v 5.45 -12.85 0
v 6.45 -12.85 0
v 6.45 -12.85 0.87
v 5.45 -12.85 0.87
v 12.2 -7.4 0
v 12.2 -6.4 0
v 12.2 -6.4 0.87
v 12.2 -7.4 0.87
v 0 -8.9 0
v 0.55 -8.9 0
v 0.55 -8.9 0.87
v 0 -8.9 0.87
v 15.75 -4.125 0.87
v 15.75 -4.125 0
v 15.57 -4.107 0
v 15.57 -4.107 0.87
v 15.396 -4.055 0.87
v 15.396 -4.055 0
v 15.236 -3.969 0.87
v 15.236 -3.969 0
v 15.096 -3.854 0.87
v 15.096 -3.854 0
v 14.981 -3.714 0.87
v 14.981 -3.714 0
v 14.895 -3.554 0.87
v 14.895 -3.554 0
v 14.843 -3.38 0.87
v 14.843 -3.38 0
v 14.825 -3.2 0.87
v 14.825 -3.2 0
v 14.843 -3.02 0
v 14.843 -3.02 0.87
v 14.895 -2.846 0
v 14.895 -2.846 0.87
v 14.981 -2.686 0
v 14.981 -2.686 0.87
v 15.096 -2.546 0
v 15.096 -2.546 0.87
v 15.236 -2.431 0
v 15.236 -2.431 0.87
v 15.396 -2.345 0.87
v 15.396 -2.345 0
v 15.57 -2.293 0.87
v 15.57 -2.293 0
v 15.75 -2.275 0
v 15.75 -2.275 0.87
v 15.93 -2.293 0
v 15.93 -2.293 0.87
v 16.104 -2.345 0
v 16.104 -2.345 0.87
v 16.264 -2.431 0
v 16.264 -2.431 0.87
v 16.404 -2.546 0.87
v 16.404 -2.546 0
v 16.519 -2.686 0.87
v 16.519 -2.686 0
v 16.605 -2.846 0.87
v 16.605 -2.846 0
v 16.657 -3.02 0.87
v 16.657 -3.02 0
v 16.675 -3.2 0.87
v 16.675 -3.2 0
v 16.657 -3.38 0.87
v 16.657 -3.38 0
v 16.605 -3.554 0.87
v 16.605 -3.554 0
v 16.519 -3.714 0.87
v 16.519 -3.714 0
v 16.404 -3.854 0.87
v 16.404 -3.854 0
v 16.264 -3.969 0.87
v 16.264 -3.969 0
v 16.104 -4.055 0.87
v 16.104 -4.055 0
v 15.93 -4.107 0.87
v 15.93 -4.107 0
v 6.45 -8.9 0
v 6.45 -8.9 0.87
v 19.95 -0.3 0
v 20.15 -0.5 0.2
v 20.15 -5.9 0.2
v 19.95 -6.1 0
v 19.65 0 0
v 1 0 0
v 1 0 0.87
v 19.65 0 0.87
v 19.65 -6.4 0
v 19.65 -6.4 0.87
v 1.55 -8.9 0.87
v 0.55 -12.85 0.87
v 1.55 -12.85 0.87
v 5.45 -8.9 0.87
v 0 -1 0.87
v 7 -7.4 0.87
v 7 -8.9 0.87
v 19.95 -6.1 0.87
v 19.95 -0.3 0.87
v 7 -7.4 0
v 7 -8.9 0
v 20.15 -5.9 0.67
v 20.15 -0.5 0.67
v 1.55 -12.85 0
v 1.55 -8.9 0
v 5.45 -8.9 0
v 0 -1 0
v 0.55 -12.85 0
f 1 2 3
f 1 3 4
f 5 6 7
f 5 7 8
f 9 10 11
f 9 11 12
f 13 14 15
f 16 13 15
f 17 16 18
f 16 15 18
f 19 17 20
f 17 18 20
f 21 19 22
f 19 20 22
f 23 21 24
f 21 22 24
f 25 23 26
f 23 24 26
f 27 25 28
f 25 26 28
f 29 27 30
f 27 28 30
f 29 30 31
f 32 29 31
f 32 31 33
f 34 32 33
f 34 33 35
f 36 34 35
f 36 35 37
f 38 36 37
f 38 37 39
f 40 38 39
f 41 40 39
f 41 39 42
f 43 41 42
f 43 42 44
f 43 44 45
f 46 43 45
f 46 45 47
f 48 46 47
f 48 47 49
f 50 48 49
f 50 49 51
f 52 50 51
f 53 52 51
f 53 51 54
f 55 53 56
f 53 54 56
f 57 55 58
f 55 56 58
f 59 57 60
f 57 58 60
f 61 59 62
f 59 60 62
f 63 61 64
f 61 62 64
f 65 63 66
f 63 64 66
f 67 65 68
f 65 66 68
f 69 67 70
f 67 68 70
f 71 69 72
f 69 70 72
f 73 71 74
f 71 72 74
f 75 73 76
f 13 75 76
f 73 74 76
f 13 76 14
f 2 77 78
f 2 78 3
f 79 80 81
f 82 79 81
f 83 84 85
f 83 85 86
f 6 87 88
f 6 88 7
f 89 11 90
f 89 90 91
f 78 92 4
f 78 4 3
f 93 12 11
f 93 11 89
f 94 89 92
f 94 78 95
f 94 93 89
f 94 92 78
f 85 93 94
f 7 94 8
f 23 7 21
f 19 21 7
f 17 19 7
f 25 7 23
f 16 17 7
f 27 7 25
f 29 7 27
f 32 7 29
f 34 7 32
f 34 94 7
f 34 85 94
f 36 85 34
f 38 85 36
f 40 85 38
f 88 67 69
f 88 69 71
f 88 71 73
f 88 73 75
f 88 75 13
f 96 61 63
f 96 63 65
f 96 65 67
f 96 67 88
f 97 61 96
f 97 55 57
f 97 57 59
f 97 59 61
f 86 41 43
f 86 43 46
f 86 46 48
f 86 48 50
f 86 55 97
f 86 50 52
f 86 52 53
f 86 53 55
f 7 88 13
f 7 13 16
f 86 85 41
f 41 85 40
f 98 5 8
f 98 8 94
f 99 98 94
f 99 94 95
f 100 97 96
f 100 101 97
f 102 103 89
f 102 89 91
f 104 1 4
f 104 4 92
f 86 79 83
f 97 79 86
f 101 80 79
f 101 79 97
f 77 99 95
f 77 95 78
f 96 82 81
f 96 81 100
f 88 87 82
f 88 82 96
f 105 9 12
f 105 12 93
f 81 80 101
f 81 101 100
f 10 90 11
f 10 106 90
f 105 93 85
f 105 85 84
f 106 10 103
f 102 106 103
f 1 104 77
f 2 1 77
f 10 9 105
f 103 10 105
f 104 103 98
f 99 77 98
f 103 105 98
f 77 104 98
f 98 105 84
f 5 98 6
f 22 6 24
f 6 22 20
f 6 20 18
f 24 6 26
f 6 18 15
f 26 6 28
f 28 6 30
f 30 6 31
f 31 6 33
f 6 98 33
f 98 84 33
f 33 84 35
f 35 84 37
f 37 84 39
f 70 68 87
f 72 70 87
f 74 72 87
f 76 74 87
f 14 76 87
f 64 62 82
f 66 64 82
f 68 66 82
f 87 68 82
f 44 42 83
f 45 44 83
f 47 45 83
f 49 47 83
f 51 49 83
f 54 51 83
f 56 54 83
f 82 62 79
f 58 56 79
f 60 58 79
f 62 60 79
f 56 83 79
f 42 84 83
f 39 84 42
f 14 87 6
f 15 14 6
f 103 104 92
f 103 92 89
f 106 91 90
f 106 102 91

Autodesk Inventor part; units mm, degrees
ref_plane "YZ Plane" through (0, 0, 0) normal (1, 0, 0) x (0, 1, 0)
ref_plane "XZ Plane" through (0, 0, 0) normal (0, 1, 0) x (-1, 0, 0)
ref_plane "XY Plane" through (0, 0, 0) normal (0, 0, 1) x (1, 0, 0)
sketch "Sketch1" plane through (0, 0, 0) normal (0, 0, 1) x (1, 0, 0)
  line L0 (0, -8.9) -> (0, 0)
  line L1 (0, 0) -> (20.15, 0)
  line L2 (20.15, 0) -> (20.15, -6.4)
  line L3 (20.15, -6.4) -> (12.2, -6.4)
  line L4 (12.2, -6.4) -> (12.2, -7.4)
  line L5 (12.2, -7.4) -> (7, -7.4)
  line L6 (7, -7.4) -> (7, -8.9)
  line L7 (7, -8.9) -> (6.45, -8.9)
  line L8 (6.45, -8.9) -> (6.45, -12.85)
  line L9 (6.45, -12.85) -> (5.45, -12.85)
  line L10 (5.45, -12.85) -> (5.45, -8.9)
  line L11 (5.45, -8.9) -> (1.55, -8.9)
  line L12 (1.55, -8.9) -> (1.55, -12.85)
  line L13 (1.55, -12.85) -> (0.55, -12.85)
  line L14 (0.55, -12.85) -> (0.55, -8.9)
  line L15 (0.55, -8.9) -> (0, -8.9)
  dimension "d0" = 20.15
  dimension "d1" = 1
  dimension "d2" = 7
  dimension "d3" = 3.9
  dimension "d4" = 1.5
  dimension "d5" = 1
  dimension "d6" = 7.4
  dimension "d7" = 12.2
  dimension "d9" = 12.85
extrude "Extrusion1" add sketch "Sketch1" along normal blind 0.87
sketch "Sketch2" plane through (0, 0, 0.87) normal (0, 0, 1) x (1, 0, 0)
  line L0 (0, 0) -> (20.15, 0) projected
  line L1 (20.15, -6.4) -> (12.2, -6.4) projected
  line L2 (20.15, 0) -> (20.15, -6.4) projected
  line L3 (15.75, -3.2) -> (15.75, 0) construction
  line L4 (15.75, -3.2) -> (15.75, -6.4) construction
  dimension "d13" = 4.4
hole "Hole1" at (15.75, -3.2, 0.87) direction (0, 0, -1) diameter 1.85 end through all
chamfer "Chamfer1" distance 0.5 angle 45 2 edges at (20.15, -6.4, 0.435) (20.15, 0, 0.435)
chamfer "Chamfer2" distance 0.2 angle 45 2 edges at (20.15, -3.2, 0.87) (20.15, -3.2, 0)
chamfer "Chamfer3" distance 1 angle 45 1 edges at (0, 0, 0.435)
properties part number "Spike Male Terminal" material "Steel, Mild"
